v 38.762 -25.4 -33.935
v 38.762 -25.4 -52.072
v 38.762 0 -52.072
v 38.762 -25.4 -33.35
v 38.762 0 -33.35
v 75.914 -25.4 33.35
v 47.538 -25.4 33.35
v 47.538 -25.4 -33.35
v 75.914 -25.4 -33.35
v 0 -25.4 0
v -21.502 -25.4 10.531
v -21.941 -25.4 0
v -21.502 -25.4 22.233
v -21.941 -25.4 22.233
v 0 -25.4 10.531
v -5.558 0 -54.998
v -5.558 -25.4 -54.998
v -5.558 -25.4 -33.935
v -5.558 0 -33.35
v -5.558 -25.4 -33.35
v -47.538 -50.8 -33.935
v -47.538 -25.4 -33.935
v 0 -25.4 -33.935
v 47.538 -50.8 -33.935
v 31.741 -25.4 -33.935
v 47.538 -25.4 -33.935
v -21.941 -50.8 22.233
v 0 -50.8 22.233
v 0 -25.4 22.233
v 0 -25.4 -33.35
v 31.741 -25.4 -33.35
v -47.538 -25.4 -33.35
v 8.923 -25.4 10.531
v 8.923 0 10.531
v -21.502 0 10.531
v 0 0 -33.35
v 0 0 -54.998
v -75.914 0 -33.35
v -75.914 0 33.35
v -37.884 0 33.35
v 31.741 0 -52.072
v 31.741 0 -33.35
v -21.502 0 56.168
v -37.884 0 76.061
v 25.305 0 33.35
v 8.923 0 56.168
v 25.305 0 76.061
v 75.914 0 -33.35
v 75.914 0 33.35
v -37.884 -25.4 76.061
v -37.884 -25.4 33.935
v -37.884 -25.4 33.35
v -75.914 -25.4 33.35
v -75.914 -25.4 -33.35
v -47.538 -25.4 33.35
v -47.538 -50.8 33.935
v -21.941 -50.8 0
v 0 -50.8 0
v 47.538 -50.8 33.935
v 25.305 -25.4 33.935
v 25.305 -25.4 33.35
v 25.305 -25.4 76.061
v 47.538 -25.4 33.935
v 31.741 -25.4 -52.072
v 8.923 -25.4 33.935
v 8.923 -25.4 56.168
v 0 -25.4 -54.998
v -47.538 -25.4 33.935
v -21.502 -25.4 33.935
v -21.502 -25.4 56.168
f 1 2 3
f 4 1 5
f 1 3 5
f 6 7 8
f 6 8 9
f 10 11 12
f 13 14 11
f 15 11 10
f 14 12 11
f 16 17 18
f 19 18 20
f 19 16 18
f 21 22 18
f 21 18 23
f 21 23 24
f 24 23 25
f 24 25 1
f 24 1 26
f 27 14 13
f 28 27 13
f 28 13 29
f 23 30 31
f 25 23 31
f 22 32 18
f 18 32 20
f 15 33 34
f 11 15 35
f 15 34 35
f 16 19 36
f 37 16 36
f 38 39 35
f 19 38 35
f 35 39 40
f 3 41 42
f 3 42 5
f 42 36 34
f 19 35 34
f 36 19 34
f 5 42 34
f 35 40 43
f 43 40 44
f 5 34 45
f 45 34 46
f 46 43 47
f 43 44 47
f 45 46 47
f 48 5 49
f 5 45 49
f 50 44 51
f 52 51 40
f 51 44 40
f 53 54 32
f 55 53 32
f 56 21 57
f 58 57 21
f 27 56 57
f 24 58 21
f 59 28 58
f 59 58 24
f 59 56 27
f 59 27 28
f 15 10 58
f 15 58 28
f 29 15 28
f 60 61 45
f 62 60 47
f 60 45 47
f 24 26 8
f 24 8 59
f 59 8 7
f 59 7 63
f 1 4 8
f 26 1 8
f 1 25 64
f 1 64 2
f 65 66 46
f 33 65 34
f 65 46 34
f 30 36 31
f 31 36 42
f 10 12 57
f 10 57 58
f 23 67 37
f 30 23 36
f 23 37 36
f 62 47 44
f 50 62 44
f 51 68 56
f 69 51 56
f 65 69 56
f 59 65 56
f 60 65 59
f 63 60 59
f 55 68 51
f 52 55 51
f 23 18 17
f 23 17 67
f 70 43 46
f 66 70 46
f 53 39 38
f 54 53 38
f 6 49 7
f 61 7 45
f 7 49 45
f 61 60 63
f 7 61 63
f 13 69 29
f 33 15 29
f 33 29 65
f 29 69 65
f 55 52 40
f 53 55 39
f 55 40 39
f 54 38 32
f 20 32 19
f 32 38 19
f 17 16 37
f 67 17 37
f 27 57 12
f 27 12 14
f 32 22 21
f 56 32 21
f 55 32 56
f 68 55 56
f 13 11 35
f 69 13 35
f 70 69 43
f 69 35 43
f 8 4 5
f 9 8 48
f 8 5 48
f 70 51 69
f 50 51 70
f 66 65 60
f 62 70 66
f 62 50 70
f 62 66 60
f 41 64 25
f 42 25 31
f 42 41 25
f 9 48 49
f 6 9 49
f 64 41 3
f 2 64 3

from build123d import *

# Parameters (mm, degrees)
F0_W     = 5.5582858622
F0_H     = 21.6480456293
F0_W_2   = 7.0209950209
F0_H_2   = 43.2960875332
F0_H_3   = 18.7226310372
F1_DEPTH = 25.4
F3_W     = 95.0758680701
F3_H     = 67.8695440292
F3_W_2   = 21.9405852258
F3_H_2   = 22.2331248224
F4_DEPTH = 25.4


with BuildPart() as f1:
    # F0 (on Front) → F1 (new body)
    with BuildSketch(Plane.XZ):
        Polygon((-37.8840751946, 33.3496890962), (-75.9144276381, 33.3496890962), (-75.9144276381, -33.3496890962), (-5.5582858622, -33.3496890962), (-5.5582858622, -11.7016434669), (0, -11.7016434669), (0, -33.3496890962), (31.740706414, -33.3496890962), (31.740706414, 9.946398437), (38.7617014349, 9.946398437), (38.7617014349, -33.3496890962), (75.9144276381, -33.3496890962), (75.9144276381, 33.3496890962), (25.3048082814, 33.3496890962), (25.3048082814, -9.3613192439), (-37.8840751946, -9.3613192439), align=None)
        Polygon((-37.8840751946, 76.0606974363), (-37.8840751946, 33.3496890962), (-21.5017739683, 33.3496890962), (-21.5017739683, 56.1678977683), (8.9225070551, 56.1678977683), (8.9225070551, 33.3496890962), (25.3048082814, 33.3496890962), (25.3048082814, 76.0606974363), align=None)
        Polygon((-21.5017739683, 33.3496890962), (-37.8840751946, 33.3496890962), (-37.8840751946, -9.3613192439), (25.3048082814, -9.3613192439), (25.3048082814, 33.3496890962), (8.9225070551, 33.3496890962), (8.9225070551, 10.5314804241), (-21.5017739683, 10.5314804241), align=None)
        with Locations((-2.7791429311, -22.5256662816)):
            Rectangle(F0_W, F0_H)
        with Locations((-2.7791429311, -44.1737119108)):
            Rectangle(F0_W, F0_H)
        with Locations((35.2512039244, -11.7016453296)):
            Rectangle(F0_W_2, F0_H_2)
        with Locations((35.2512039244, -42.7110046148)):
            Rectangle(F0_W_2, F0_H_3)
    extrude(amount=F1_DEPTH)

    # F3 (on face) → F4 (join)
    with BuildSketch(Plane.XZ.offset(25.4)):
        Rectangle(F3_W, F3_H)
        with Locations((-10.9702926129, 11.1165624112)):
            Rectangle(F3_W_2, F3_H_2, mode=Mode.SUBTRACT)
    extrude(amount=F4_DEPTH)


solid = f1.part
